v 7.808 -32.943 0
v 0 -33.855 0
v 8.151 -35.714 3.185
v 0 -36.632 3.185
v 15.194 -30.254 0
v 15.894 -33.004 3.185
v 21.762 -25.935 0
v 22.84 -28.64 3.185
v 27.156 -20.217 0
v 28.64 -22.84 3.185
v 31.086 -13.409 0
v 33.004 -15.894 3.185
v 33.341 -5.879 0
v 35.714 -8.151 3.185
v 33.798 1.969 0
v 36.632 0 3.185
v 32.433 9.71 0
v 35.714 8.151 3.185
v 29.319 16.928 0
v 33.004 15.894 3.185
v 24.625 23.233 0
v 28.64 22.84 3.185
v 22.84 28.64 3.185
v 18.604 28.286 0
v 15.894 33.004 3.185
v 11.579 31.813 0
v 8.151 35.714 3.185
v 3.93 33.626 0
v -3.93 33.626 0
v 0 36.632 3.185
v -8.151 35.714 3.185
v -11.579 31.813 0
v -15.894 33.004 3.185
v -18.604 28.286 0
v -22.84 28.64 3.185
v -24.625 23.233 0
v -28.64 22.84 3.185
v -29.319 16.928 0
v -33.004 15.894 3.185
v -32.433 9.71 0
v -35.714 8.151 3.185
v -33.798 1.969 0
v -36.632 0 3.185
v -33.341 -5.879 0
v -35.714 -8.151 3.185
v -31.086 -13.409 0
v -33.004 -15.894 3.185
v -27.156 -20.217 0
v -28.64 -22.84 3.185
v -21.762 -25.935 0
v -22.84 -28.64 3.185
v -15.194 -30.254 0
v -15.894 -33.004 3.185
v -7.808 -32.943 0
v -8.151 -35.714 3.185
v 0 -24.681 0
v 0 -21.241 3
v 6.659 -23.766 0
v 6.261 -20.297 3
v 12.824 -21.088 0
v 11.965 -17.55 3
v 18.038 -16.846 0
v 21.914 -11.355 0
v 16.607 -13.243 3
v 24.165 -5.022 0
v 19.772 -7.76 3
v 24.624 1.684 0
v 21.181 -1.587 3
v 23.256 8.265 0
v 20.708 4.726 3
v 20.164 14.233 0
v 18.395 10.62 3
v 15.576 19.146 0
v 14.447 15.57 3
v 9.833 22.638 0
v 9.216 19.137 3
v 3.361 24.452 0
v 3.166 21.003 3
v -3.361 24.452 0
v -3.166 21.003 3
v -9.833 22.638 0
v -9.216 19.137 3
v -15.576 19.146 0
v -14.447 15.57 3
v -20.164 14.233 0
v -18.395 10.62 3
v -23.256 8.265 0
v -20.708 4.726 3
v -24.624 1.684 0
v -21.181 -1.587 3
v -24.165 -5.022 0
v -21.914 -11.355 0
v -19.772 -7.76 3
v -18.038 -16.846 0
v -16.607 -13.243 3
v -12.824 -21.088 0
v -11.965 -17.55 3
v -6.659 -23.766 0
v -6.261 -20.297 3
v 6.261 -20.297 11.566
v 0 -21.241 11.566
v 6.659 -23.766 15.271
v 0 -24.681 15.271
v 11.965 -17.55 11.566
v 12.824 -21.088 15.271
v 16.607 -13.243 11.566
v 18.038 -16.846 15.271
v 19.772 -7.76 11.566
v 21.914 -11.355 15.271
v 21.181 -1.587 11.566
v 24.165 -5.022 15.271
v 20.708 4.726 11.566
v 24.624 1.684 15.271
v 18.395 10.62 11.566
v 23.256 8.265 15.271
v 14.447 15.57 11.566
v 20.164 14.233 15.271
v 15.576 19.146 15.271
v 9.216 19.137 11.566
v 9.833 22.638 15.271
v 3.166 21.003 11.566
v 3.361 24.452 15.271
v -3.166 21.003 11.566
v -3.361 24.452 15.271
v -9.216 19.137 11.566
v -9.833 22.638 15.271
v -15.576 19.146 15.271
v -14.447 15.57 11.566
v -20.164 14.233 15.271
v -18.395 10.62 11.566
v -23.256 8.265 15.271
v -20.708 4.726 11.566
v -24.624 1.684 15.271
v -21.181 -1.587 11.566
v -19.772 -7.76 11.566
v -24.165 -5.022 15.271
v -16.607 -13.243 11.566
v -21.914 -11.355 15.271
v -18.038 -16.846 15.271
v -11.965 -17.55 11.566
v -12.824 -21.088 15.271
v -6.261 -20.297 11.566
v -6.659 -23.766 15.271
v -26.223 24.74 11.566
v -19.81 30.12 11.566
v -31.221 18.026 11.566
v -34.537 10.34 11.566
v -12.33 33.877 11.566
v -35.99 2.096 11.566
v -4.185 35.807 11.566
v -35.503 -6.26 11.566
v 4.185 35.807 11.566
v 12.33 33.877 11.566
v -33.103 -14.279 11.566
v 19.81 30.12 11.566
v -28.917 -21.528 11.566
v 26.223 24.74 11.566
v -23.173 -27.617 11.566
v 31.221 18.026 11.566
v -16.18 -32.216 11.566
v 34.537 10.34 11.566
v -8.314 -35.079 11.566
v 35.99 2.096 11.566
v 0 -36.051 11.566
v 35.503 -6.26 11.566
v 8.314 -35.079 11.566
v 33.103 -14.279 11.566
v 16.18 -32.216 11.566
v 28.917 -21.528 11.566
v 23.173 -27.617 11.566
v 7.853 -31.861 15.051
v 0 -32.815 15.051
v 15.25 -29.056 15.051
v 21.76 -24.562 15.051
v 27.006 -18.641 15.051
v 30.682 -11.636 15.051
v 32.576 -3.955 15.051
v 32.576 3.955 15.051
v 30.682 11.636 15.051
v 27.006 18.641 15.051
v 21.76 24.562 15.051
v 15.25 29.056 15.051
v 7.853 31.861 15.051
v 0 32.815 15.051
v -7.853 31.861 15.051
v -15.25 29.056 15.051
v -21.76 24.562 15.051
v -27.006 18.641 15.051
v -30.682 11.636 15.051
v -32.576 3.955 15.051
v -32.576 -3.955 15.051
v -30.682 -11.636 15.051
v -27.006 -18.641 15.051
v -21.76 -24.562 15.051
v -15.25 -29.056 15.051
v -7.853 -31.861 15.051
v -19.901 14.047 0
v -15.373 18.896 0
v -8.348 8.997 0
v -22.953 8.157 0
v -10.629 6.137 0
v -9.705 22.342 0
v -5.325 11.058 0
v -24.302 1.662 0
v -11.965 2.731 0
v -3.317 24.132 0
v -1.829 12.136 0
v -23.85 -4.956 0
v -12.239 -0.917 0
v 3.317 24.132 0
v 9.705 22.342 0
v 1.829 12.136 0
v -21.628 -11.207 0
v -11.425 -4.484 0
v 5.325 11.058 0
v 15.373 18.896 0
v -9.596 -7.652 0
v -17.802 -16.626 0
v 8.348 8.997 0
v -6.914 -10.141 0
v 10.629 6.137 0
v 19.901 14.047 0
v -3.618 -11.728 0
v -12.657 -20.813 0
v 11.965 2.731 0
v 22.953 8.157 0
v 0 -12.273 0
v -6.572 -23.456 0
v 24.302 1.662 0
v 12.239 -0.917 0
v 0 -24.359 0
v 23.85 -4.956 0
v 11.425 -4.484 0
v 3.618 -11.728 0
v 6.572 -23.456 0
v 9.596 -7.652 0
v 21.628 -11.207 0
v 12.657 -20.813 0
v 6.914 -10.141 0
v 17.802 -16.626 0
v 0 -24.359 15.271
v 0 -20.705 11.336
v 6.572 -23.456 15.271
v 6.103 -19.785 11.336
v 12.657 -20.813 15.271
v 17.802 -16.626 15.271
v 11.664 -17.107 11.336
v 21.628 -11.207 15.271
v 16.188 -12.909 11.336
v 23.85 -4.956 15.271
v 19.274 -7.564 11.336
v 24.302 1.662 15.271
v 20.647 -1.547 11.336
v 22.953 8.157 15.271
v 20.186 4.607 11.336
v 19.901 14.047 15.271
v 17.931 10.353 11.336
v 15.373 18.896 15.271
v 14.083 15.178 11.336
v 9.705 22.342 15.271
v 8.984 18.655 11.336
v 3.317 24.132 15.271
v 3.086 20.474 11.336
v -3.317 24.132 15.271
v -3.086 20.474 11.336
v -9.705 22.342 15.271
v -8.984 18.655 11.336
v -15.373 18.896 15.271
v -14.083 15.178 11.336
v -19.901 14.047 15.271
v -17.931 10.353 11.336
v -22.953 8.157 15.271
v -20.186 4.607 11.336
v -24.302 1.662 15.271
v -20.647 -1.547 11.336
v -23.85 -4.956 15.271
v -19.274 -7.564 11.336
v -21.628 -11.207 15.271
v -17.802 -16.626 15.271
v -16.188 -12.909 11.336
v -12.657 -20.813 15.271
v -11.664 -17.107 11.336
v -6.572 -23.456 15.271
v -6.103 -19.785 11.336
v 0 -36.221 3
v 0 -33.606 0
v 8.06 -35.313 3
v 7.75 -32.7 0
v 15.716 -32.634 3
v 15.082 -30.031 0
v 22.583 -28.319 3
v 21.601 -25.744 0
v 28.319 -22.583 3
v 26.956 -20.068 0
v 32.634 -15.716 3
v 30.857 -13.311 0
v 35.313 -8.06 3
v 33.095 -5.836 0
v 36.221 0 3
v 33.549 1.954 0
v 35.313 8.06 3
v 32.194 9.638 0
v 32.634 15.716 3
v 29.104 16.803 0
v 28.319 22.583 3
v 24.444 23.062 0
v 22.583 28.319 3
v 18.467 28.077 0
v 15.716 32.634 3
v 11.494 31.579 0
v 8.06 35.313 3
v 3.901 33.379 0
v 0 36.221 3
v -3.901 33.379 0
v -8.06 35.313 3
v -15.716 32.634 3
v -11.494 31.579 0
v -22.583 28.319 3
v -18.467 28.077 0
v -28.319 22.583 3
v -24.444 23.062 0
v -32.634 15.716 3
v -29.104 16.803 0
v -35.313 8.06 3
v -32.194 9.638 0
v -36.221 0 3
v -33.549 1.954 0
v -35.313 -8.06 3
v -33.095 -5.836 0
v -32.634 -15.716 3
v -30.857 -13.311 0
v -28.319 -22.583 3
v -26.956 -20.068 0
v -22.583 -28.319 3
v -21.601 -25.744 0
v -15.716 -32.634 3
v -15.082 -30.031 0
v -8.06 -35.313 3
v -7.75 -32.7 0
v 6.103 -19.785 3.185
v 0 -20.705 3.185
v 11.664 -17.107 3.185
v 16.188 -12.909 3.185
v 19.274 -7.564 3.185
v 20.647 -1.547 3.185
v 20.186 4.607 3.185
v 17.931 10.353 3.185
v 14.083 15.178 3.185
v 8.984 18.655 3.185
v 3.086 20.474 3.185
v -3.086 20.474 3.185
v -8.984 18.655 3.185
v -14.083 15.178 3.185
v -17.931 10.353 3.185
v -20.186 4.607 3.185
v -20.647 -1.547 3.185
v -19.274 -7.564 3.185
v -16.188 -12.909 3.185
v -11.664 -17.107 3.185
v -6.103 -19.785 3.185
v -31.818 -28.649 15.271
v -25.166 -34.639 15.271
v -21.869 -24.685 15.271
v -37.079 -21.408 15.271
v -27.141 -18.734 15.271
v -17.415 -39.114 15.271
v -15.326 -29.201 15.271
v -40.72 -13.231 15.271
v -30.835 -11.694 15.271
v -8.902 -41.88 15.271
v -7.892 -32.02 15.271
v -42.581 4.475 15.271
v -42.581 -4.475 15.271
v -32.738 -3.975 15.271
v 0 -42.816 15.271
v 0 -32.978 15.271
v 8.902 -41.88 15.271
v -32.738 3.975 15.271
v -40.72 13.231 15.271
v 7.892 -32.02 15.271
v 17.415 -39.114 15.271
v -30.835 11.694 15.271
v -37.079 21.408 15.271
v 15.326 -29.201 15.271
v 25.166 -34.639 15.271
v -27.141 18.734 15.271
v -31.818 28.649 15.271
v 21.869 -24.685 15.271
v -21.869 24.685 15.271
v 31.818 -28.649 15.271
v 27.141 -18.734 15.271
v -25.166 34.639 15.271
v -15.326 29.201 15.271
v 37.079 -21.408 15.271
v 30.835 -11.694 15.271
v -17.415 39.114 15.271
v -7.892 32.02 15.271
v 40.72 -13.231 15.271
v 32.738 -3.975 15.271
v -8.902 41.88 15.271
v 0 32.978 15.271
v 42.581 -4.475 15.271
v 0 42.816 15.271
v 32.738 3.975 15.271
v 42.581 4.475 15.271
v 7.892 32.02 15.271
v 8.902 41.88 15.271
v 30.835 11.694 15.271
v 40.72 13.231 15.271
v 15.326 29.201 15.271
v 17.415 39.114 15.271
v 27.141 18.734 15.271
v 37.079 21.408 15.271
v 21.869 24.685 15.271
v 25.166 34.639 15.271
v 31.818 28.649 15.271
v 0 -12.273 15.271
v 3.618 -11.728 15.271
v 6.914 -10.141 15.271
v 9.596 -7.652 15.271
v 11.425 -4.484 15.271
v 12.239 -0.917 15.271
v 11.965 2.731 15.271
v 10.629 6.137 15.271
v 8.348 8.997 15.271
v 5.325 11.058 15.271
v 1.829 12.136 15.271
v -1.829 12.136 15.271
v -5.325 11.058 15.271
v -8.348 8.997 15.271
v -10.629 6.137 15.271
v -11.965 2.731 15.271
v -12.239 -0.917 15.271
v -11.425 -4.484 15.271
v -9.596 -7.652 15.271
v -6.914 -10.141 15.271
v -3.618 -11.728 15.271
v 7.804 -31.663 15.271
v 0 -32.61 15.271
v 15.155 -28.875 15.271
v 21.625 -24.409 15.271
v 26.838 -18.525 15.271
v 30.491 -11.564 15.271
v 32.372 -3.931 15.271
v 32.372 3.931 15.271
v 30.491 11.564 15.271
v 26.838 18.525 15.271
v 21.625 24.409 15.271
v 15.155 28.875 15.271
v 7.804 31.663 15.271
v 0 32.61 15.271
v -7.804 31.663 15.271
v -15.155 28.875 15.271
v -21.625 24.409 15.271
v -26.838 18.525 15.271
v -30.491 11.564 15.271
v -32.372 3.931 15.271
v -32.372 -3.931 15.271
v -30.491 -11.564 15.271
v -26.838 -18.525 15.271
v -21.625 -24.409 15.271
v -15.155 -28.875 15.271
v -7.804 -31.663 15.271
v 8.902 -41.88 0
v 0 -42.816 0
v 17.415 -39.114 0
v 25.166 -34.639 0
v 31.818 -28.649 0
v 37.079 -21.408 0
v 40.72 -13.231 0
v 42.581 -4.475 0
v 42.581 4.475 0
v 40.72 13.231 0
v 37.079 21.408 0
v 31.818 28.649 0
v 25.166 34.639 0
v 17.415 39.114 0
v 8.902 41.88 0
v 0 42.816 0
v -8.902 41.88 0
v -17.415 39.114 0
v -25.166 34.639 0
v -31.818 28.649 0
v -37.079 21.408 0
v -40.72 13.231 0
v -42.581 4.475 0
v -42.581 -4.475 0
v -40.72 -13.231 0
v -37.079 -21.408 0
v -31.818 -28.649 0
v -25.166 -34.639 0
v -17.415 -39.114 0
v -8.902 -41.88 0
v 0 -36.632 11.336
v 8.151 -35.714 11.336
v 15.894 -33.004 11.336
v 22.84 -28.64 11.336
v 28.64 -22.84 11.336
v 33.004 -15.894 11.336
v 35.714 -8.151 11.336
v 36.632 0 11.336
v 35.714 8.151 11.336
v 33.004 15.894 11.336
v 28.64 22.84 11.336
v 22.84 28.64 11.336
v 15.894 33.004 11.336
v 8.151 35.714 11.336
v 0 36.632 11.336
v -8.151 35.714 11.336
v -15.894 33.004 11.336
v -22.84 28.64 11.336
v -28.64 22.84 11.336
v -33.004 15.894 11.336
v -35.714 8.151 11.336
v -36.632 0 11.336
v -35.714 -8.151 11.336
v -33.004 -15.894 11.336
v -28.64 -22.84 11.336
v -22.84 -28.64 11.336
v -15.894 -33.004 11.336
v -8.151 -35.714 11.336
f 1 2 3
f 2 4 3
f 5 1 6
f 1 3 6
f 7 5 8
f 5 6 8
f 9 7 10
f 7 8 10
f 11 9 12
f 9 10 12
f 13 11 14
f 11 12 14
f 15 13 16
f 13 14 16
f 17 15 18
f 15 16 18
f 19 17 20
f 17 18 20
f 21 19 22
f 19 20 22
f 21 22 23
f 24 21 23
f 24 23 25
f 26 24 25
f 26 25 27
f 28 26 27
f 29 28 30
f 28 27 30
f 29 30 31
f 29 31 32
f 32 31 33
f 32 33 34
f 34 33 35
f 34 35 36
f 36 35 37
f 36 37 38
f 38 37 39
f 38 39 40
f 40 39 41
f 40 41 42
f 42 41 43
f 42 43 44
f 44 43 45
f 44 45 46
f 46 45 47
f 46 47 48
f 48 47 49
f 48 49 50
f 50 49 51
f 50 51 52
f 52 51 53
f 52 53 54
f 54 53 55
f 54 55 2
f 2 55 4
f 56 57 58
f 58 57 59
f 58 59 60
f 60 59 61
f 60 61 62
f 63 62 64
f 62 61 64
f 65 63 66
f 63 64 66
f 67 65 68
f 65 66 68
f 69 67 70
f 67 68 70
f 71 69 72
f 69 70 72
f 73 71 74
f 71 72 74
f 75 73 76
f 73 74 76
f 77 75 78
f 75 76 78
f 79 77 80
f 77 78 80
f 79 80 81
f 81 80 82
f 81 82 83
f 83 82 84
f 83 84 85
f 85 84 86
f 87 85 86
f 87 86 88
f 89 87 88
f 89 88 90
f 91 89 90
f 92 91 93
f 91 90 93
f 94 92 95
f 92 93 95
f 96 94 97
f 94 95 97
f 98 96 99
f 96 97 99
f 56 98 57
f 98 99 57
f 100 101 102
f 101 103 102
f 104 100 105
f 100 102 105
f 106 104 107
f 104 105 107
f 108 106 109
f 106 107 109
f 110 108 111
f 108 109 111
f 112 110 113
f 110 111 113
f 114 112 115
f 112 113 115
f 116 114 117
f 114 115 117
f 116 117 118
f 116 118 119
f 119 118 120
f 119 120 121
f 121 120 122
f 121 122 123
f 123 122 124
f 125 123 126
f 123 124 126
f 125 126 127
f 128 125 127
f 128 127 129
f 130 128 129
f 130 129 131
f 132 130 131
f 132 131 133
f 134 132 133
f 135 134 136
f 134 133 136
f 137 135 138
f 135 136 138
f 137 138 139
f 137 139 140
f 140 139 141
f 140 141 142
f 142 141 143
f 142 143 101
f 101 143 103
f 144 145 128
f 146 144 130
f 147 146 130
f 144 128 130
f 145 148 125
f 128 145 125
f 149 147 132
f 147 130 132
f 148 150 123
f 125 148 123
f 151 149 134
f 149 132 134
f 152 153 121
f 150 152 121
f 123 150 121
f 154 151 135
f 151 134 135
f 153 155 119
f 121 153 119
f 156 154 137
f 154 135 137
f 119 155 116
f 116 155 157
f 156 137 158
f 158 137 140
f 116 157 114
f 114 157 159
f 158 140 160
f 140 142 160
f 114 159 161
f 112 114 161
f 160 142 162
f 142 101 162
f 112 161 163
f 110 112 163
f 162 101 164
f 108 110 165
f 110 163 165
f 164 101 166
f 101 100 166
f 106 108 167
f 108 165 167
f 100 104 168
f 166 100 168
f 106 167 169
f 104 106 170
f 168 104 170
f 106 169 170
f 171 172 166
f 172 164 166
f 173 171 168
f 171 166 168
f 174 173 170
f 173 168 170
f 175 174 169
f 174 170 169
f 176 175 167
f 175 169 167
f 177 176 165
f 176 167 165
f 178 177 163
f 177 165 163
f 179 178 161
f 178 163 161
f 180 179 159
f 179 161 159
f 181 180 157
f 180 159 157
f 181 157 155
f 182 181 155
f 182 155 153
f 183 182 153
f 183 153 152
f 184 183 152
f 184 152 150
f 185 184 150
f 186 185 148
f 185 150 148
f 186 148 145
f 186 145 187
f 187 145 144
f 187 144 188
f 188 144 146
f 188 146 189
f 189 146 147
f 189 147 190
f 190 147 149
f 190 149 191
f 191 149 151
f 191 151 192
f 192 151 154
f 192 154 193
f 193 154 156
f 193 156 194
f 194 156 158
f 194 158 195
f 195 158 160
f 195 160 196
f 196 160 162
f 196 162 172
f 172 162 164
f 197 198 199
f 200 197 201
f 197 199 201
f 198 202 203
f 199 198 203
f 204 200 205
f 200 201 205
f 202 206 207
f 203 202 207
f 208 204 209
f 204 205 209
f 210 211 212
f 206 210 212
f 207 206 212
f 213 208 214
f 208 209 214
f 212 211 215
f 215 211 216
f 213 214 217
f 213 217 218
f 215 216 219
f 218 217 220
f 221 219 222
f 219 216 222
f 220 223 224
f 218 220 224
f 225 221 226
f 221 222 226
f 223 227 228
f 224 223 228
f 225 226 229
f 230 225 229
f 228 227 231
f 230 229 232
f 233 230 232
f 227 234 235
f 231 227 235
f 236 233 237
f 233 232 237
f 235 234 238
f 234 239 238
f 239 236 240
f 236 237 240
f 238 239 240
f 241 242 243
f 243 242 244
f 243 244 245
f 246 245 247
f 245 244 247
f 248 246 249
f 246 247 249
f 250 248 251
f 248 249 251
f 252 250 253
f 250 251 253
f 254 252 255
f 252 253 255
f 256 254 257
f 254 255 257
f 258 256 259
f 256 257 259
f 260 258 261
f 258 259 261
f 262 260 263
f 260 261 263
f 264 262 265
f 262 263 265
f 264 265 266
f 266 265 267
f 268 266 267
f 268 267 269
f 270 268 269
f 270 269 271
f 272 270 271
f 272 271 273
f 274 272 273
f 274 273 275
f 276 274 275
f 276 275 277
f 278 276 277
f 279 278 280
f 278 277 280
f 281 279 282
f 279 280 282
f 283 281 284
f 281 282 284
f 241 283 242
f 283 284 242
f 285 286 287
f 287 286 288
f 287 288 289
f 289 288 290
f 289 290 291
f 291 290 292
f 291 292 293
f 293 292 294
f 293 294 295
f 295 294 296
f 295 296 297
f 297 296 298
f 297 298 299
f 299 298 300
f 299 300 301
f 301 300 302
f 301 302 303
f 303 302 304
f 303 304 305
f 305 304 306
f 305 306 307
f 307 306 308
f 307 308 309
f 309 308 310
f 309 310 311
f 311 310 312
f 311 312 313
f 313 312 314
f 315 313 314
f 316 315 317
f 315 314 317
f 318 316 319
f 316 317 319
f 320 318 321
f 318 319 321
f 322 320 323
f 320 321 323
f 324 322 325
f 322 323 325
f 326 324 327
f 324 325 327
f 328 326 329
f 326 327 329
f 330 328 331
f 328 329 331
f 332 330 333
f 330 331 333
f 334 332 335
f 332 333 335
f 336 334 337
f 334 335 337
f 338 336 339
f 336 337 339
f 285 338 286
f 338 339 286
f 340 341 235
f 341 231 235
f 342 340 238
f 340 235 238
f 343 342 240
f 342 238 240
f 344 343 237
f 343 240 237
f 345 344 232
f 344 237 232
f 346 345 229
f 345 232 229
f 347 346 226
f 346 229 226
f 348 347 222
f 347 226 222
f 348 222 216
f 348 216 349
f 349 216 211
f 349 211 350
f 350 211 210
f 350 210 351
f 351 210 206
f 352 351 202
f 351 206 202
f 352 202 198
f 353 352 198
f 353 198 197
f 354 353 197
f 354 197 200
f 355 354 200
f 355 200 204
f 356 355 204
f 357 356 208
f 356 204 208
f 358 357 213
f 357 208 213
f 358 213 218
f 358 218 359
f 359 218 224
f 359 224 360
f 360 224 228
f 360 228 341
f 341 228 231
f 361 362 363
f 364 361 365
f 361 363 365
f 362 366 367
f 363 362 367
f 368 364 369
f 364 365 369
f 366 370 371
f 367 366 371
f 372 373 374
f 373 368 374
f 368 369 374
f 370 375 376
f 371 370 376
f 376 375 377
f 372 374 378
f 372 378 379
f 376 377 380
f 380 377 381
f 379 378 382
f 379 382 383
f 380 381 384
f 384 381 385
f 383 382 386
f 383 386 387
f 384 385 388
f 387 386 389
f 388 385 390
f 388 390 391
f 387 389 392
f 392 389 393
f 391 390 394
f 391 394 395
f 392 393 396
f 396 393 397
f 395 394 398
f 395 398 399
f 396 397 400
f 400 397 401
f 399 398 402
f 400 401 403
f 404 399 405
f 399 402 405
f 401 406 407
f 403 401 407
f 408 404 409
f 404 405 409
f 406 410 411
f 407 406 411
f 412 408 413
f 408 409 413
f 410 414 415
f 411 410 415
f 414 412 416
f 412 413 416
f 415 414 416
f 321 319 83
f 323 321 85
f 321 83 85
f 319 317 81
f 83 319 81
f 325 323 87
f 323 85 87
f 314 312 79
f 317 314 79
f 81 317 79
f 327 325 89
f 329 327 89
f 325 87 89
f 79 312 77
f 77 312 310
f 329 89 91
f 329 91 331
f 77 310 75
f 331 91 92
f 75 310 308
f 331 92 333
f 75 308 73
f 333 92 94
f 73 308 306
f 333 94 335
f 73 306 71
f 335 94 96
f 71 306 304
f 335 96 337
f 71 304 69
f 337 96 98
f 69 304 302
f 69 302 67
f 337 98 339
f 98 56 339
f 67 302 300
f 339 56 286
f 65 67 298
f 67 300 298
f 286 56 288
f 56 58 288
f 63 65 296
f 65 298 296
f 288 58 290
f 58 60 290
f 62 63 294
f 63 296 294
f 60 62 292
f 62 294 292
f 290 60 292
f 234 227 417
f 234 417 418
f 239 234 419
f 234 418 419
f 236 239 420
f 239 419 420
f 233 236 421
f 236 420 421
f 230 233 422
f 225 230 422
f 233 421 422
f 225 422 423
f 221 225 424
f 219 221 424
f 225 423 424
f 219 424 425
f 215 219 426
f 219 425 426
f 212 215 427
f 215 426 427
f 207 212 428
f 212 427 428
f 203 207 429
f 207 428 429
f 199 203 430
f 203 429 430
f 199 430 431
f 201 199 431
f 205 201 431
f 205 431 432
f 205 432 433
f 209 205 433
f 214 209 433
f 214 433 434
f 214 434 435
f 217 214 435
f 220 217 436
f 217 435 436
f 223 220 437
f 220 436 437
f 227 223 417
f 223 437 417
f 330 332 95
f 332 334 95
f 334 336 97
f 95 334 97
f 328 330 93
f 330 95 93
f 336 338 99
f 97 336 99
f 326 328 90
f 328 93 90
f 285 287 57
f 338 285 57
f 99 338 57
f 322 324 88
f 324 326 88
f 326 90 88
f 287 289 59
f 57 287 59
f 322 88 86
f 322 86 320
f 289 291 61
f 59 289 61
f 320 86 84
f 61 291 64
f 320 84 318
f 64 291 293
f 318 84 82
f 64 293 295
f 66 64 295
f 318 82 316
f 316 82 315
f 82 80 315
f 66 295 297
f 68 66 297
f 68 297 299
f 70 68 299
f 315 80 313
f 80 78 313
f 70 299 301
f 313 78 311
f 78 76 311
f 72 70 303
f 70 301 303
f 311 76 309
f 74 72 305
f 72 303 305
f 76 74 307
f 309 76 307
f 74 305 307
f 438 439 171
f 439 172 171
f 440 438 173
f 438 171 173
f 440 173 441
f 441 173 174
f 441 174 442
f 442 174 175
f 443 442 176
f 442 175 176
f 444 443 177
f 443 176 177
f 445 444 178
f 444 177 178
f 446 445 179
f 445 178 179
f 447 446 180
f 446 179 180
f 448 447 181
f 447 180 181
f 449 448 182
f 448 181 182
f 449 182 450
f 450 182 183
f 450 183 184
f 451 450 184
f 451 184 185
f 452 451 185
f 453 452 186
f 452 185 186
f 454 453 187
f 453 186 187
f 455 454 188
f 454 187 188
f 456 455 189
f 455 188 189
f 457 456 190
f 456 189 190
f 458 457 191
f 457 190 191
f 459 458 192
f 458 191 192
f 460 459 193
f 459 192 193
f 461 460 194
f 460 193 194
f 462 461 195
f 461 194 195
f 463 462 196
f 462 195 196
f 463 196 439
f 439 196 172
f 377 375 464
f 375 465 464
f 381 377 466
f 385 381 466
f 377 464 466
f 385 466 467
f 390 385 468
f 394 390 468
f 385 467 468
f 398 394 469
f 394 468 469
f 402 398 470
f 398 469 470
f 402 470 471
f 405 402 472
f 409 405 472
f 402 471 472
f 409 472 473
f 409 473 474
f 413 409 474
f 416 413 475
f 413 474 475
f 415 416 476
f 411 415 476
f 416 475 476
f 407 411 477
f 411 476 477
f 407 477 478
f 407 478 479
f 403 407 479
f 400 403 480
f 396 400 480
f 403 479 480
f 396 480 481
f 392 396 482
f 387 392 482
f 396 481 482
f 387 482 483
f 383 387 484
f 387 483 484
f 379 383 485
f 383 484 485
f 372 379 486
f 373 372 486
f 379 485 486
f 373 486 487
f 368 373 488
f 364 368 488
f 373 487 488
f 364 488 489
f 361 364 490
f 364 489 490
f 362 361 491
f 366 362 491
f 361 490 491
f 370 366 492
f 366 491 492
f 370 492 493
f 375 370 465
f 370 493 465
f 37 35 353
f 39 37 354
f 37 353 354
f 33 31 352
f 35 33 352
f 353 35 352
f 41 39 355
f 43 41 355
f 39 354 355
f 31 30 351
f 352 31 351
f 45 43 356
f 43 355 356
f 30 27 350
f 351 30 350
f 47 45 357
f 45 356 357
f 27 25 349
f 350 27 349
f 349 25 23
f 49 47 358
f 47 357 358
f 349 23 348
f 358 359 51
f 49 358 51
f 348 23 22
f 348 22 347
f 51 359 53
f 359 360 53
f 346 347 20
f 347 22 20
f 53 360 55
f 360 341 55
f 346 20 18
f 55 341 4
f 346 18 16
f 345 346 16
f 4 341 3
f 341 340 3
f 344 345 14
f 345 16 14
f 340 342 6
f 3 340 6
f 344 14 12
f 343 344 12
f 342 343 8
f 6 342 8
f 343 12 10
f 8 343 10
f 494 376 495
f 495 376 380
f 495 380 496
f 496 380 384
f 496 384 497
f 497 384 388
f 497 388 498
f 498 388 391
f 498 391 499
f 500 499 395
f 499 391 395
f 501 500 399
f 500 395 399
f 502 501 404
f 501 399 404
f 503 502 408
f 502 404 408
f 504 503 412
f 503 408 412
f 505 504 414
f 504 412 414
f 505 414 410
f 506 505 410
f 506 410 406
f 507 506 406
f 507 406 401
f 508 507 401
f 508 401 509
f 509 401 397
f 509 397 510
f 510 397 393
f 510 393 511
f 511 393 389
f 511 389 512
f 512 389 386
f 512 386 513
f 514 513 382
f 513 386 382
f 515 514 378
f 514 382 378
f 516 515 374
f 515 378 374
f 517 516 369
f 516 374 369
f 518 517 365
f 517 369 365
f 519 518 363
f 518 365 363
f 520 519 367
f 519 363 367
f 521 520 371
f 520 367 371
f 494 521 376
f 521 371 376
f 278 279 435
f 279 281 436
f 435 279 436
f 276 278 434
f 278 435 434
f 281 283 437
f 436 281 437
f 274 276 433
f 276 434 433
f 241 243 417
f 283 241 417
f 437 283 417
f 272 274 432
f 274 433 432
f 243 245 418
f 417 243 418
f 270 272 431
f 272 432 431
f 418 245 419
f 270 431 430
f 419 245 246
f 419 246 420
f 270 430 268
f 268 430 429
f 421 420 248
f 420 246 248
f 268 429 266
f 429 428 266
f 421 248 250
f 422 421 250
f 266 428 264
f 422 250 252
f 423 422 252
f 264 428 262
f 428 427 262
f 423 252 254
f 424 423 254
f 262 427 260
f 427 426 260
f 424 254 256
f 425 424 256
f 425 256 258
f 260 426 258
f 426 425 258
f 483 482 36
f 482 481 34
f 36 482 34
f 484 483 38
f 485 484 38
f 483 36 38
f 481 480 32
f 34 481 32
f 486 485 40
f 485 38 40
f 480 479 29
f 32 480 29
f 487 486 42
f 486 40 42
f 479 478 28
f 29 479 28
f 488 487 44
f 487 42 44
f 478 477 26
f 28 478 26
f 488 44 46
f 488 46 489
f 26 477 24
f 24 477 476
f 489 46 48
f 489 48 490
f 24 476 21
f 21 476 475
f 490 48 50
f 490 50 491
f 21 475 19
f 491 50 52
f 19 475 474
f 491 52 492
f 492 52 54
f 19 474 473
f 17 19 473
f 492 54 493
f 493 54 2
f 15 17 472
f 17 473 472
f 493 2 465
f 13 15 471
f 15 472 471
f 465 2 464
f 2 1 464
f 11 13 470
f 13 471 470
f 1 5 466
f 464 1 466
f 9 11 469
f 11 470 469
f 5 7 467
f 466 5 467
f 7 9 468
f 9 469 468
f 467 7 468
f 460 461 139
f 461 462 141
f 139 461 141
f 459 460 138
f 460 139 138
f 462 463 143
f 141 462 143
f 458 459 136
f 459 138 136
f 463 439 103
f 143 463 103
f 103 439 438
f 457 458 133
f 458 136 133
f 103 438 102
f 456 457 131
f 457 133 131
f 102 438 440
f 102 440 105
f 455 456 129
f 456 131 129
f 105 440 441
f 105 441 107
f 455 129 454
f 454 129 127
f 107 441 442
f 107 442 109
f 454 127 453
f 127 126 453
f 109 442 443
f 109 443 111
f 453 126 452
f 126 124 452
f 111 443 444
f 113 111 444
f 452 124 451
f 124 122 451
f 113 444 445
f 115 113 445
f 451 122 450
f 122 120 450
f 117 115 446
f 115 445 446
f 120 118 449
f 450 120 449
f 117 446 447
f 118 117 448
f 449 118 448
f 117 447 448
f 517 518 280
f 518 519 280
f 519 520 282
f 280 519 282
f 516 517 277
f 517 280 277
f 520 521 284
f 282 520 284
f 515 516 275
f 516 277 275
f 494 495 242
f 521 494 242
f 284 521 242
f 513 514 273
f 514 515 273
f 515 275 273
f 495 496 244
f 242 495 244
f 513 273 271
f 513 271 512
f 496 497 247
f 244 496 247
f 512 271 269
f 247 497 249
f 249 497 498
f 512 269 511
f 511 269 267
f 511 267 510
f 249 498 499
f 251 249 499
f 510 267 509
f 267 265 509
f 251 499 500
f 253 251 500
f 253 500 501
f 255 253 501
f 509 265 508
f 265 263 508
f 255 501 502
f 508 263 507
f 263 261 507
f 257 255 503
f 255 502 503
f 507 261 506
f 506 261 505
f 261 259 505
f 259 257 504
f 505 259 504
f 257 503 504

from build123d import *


with BuildPart() as f1:
    # F0 (on Right) → F1 (revolve)
    with BuildSketch(Plane.YZ):
        Polygon((-42.815655, 15.27123), (-42.815655, 0), (-33.855191, 0), (-36.632214, 3.185409), (-20.705163, 3.185409), (-24.359016, 0), (-20.705163, 0), (-12.273197, 0), (-12.273197, 15.27123), (-24.359016, 15.27123), (-20.705163, 11.336311), (-36.632214, 11.336311), (-32.978363, 15.27123), align=None)
        Polygon((-32.610254, 15.27123), (-32.81489, 15.050852), (-36.051148, 11.565648), (-21.240558, 11.565648), (-24.681455, 15.27123), align=None)
        Polygon((-33.605838, 0), (-24.681455, 0), (-21.240558, 2.999755), (-36.221009, 2.999755), align=None)
    revolve(axis=Axis((0, 0, 8.806721), (0, 0, 1)))


solid = f1.part
